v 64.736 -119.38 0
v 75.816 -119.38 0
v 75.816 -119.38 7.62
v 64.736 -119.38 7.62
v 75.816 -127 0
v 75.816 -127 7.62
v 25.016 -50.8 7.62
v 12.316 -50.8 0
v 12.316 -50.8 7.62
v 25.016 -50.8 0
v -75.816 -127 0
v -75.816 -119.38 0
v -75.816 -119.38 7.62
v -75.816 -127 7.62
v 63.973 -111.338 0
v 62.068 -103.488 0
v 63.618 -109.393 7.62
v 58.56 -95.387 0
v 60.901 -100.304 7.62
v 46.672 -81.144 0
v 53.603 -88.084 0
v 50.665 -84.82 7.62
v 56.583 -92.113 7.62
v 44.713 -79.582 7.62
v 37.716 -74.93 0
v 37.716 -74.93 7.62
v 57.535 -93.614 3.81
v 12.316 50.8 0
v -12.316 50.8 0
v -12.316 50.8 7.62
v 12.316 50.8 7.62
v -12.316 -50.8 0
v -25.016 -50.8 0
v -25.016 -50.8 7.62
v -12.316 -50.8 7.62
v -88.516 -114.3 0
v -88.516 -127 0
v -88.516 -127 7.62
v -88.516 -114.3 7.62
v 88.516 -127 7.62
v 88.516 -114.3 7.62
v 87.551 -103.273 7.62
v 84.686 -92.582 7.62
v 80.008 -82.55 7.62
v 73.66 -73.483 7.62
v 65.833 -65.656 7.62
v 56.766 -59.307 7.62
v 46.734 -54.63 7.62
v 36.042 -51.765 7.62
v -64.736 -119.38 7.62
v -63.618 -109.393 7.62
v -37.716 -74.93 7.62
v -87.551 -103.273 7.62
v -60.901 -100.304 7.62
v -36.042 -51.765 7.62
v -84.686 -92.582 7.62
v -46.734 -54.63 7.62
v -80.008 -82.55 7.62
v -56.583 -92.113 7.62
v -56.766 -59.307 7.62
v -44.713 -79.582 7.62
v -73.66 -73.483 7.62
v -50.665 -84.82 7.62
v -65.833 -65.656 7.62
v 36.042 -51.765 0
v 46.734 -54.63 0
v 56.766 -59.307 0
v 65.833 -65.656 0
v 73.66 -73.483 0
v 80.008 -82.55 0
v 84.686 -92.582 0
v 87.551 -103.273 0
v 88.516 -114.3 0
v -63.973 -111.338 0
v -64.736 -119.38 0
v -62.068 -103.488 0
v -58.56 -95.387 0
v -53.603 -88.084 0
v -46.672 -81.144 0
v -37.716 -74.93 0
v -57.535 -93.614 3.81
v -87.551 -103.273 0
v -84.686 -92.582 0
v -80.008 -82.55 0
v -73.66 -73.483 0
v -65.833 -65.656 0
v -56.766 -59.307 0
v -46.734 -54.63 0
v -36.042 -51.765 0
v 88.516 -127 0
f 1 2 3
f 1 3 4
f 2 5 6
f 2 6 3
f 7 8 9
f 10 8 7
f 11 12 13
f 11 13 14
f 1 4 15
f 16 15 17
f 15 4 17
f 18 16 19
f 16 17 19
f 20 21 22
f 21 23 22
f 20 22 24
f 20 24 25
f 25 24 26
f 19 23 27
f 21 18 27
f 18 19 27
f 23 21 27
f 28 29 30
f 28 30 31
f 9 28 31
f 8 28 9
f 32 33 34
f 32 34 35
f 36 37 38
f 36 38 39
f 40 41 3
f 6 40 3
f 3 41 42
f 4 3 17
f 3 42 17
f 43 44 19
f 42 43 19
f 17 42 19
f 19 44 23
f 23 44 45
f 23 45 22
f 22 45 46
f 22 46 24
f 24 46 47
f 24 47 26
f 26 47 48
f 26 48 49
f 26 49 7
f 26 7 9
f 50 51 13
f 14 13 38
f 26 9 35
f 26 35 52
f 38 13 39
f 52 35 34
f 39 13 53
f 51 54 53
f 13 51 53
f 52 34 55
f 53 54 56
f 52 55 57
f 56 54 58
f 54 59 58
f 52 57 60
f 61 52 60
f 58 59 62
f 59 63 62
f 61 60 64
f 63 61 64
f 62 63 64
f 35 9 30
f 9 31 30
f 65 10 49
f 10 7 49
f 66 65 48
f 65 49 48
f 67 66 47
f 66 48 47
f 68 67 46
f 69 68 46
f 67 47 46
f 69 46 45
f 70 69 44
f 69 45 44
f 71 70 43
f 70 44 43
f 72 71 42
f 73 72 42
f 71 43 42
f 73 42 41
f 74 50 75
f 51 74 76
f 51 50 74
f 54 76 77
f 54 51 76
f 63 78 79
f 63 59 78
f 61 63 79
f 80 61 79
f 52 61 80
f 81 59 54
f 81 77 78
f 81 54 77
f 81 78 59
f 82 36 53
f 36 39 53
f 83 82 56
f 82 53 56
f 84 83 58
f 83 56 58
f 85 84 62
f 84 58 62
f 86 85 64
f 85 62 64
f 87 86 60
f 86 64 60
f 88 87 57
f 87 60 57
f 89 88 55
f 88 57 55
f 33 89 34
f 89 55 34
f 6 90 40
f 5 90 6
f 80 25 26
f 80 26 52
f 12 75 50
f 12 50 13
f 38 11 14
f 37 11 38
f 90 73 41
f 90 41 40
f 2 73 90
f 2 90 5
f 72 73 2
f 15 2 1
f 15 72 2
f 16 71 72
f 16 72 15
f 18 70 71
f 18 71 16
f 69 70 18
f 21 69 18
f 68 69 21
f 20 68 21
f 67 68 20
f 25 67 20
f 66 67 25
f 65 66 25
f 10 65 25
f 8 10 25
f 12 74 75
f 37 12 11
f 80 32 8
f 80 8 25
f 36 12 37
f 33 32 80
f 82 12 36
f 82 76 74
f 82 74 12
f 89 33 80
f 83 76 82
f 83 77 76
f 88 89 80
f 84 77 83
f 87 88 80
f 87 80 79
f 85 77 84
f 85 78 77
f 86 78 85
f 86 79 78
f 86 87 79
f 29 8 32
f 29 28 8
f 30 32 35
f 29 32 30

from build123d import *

# Parameters (mm, degrees)
BOSS_EXTRUDE1_DEPTH = 7.62
FILLET1_R           = 63.5
CUT_EXTRUDE1_DEPTH  = 155.990666284


with BuildPart() as part:
    # Sketch2 → Boss-Extrude1 (new body)
    with BuildSketch(Plane.XY):
        Polygon((12.315773934, -50.8), (88.515773934, -50.8), (88.515773934, -127), (75.815773934, -127), (75.815773934, -119.38), (37.715773934, -119.38), (37.715773934, -74.93), (-37.715773934, -74.93), (-37.715773934, -119.38), (-75.815773934, -119.38), (-75.815773934, -127), (-88.515773934, -127), (-88.515773934, -50.8), (-12.315773934, -50.8), (-12.315773934, 50.8), (12.315773934, 50.8), align=None)
    extrude(amount=BOSS_EXTRUDE1_DEPTH)

    # Fillet1
    fillet1_edges = [part.edges().sort_by_distance(p)[0] for p in [
        (88.515773934, -50.8, 3.81),
        (-88.515773934, -50.8, 3.81),
    ]]
    fillet(fillet1_edges, radius=FILLET1_R)

    # Sketch3 → Cut-Extrude1 (cut, through all)
    with BuildSketch(Plane.XY.offset(7.62)):
        with BuildLine():
            Line((-37.715773934, -74.93), (-37.715773934, -119.38))
            Line((-37.715773934, -119.38), (-64.735615427, -119.38))
            add(Edge.make_bspline(
                [(-64.735615427, -119.38), (-63.844183293, -90.073264765), (-37.715773934, -74.93)],
                knots=[0, 0, 0, 1, 1, 1], degree=2))
        make_face()
    cut_extrude1 = extrude(amount=-CUT_EXTRUDE1_DEPTH, mode=Mode.SUBTRACT)

    # Mirror1: Cut-Extrude1 across plane
    add(cut_extrude1.mirror(Plane.ZY), mode=Mode.SUBTRACT)


solid = part.part
